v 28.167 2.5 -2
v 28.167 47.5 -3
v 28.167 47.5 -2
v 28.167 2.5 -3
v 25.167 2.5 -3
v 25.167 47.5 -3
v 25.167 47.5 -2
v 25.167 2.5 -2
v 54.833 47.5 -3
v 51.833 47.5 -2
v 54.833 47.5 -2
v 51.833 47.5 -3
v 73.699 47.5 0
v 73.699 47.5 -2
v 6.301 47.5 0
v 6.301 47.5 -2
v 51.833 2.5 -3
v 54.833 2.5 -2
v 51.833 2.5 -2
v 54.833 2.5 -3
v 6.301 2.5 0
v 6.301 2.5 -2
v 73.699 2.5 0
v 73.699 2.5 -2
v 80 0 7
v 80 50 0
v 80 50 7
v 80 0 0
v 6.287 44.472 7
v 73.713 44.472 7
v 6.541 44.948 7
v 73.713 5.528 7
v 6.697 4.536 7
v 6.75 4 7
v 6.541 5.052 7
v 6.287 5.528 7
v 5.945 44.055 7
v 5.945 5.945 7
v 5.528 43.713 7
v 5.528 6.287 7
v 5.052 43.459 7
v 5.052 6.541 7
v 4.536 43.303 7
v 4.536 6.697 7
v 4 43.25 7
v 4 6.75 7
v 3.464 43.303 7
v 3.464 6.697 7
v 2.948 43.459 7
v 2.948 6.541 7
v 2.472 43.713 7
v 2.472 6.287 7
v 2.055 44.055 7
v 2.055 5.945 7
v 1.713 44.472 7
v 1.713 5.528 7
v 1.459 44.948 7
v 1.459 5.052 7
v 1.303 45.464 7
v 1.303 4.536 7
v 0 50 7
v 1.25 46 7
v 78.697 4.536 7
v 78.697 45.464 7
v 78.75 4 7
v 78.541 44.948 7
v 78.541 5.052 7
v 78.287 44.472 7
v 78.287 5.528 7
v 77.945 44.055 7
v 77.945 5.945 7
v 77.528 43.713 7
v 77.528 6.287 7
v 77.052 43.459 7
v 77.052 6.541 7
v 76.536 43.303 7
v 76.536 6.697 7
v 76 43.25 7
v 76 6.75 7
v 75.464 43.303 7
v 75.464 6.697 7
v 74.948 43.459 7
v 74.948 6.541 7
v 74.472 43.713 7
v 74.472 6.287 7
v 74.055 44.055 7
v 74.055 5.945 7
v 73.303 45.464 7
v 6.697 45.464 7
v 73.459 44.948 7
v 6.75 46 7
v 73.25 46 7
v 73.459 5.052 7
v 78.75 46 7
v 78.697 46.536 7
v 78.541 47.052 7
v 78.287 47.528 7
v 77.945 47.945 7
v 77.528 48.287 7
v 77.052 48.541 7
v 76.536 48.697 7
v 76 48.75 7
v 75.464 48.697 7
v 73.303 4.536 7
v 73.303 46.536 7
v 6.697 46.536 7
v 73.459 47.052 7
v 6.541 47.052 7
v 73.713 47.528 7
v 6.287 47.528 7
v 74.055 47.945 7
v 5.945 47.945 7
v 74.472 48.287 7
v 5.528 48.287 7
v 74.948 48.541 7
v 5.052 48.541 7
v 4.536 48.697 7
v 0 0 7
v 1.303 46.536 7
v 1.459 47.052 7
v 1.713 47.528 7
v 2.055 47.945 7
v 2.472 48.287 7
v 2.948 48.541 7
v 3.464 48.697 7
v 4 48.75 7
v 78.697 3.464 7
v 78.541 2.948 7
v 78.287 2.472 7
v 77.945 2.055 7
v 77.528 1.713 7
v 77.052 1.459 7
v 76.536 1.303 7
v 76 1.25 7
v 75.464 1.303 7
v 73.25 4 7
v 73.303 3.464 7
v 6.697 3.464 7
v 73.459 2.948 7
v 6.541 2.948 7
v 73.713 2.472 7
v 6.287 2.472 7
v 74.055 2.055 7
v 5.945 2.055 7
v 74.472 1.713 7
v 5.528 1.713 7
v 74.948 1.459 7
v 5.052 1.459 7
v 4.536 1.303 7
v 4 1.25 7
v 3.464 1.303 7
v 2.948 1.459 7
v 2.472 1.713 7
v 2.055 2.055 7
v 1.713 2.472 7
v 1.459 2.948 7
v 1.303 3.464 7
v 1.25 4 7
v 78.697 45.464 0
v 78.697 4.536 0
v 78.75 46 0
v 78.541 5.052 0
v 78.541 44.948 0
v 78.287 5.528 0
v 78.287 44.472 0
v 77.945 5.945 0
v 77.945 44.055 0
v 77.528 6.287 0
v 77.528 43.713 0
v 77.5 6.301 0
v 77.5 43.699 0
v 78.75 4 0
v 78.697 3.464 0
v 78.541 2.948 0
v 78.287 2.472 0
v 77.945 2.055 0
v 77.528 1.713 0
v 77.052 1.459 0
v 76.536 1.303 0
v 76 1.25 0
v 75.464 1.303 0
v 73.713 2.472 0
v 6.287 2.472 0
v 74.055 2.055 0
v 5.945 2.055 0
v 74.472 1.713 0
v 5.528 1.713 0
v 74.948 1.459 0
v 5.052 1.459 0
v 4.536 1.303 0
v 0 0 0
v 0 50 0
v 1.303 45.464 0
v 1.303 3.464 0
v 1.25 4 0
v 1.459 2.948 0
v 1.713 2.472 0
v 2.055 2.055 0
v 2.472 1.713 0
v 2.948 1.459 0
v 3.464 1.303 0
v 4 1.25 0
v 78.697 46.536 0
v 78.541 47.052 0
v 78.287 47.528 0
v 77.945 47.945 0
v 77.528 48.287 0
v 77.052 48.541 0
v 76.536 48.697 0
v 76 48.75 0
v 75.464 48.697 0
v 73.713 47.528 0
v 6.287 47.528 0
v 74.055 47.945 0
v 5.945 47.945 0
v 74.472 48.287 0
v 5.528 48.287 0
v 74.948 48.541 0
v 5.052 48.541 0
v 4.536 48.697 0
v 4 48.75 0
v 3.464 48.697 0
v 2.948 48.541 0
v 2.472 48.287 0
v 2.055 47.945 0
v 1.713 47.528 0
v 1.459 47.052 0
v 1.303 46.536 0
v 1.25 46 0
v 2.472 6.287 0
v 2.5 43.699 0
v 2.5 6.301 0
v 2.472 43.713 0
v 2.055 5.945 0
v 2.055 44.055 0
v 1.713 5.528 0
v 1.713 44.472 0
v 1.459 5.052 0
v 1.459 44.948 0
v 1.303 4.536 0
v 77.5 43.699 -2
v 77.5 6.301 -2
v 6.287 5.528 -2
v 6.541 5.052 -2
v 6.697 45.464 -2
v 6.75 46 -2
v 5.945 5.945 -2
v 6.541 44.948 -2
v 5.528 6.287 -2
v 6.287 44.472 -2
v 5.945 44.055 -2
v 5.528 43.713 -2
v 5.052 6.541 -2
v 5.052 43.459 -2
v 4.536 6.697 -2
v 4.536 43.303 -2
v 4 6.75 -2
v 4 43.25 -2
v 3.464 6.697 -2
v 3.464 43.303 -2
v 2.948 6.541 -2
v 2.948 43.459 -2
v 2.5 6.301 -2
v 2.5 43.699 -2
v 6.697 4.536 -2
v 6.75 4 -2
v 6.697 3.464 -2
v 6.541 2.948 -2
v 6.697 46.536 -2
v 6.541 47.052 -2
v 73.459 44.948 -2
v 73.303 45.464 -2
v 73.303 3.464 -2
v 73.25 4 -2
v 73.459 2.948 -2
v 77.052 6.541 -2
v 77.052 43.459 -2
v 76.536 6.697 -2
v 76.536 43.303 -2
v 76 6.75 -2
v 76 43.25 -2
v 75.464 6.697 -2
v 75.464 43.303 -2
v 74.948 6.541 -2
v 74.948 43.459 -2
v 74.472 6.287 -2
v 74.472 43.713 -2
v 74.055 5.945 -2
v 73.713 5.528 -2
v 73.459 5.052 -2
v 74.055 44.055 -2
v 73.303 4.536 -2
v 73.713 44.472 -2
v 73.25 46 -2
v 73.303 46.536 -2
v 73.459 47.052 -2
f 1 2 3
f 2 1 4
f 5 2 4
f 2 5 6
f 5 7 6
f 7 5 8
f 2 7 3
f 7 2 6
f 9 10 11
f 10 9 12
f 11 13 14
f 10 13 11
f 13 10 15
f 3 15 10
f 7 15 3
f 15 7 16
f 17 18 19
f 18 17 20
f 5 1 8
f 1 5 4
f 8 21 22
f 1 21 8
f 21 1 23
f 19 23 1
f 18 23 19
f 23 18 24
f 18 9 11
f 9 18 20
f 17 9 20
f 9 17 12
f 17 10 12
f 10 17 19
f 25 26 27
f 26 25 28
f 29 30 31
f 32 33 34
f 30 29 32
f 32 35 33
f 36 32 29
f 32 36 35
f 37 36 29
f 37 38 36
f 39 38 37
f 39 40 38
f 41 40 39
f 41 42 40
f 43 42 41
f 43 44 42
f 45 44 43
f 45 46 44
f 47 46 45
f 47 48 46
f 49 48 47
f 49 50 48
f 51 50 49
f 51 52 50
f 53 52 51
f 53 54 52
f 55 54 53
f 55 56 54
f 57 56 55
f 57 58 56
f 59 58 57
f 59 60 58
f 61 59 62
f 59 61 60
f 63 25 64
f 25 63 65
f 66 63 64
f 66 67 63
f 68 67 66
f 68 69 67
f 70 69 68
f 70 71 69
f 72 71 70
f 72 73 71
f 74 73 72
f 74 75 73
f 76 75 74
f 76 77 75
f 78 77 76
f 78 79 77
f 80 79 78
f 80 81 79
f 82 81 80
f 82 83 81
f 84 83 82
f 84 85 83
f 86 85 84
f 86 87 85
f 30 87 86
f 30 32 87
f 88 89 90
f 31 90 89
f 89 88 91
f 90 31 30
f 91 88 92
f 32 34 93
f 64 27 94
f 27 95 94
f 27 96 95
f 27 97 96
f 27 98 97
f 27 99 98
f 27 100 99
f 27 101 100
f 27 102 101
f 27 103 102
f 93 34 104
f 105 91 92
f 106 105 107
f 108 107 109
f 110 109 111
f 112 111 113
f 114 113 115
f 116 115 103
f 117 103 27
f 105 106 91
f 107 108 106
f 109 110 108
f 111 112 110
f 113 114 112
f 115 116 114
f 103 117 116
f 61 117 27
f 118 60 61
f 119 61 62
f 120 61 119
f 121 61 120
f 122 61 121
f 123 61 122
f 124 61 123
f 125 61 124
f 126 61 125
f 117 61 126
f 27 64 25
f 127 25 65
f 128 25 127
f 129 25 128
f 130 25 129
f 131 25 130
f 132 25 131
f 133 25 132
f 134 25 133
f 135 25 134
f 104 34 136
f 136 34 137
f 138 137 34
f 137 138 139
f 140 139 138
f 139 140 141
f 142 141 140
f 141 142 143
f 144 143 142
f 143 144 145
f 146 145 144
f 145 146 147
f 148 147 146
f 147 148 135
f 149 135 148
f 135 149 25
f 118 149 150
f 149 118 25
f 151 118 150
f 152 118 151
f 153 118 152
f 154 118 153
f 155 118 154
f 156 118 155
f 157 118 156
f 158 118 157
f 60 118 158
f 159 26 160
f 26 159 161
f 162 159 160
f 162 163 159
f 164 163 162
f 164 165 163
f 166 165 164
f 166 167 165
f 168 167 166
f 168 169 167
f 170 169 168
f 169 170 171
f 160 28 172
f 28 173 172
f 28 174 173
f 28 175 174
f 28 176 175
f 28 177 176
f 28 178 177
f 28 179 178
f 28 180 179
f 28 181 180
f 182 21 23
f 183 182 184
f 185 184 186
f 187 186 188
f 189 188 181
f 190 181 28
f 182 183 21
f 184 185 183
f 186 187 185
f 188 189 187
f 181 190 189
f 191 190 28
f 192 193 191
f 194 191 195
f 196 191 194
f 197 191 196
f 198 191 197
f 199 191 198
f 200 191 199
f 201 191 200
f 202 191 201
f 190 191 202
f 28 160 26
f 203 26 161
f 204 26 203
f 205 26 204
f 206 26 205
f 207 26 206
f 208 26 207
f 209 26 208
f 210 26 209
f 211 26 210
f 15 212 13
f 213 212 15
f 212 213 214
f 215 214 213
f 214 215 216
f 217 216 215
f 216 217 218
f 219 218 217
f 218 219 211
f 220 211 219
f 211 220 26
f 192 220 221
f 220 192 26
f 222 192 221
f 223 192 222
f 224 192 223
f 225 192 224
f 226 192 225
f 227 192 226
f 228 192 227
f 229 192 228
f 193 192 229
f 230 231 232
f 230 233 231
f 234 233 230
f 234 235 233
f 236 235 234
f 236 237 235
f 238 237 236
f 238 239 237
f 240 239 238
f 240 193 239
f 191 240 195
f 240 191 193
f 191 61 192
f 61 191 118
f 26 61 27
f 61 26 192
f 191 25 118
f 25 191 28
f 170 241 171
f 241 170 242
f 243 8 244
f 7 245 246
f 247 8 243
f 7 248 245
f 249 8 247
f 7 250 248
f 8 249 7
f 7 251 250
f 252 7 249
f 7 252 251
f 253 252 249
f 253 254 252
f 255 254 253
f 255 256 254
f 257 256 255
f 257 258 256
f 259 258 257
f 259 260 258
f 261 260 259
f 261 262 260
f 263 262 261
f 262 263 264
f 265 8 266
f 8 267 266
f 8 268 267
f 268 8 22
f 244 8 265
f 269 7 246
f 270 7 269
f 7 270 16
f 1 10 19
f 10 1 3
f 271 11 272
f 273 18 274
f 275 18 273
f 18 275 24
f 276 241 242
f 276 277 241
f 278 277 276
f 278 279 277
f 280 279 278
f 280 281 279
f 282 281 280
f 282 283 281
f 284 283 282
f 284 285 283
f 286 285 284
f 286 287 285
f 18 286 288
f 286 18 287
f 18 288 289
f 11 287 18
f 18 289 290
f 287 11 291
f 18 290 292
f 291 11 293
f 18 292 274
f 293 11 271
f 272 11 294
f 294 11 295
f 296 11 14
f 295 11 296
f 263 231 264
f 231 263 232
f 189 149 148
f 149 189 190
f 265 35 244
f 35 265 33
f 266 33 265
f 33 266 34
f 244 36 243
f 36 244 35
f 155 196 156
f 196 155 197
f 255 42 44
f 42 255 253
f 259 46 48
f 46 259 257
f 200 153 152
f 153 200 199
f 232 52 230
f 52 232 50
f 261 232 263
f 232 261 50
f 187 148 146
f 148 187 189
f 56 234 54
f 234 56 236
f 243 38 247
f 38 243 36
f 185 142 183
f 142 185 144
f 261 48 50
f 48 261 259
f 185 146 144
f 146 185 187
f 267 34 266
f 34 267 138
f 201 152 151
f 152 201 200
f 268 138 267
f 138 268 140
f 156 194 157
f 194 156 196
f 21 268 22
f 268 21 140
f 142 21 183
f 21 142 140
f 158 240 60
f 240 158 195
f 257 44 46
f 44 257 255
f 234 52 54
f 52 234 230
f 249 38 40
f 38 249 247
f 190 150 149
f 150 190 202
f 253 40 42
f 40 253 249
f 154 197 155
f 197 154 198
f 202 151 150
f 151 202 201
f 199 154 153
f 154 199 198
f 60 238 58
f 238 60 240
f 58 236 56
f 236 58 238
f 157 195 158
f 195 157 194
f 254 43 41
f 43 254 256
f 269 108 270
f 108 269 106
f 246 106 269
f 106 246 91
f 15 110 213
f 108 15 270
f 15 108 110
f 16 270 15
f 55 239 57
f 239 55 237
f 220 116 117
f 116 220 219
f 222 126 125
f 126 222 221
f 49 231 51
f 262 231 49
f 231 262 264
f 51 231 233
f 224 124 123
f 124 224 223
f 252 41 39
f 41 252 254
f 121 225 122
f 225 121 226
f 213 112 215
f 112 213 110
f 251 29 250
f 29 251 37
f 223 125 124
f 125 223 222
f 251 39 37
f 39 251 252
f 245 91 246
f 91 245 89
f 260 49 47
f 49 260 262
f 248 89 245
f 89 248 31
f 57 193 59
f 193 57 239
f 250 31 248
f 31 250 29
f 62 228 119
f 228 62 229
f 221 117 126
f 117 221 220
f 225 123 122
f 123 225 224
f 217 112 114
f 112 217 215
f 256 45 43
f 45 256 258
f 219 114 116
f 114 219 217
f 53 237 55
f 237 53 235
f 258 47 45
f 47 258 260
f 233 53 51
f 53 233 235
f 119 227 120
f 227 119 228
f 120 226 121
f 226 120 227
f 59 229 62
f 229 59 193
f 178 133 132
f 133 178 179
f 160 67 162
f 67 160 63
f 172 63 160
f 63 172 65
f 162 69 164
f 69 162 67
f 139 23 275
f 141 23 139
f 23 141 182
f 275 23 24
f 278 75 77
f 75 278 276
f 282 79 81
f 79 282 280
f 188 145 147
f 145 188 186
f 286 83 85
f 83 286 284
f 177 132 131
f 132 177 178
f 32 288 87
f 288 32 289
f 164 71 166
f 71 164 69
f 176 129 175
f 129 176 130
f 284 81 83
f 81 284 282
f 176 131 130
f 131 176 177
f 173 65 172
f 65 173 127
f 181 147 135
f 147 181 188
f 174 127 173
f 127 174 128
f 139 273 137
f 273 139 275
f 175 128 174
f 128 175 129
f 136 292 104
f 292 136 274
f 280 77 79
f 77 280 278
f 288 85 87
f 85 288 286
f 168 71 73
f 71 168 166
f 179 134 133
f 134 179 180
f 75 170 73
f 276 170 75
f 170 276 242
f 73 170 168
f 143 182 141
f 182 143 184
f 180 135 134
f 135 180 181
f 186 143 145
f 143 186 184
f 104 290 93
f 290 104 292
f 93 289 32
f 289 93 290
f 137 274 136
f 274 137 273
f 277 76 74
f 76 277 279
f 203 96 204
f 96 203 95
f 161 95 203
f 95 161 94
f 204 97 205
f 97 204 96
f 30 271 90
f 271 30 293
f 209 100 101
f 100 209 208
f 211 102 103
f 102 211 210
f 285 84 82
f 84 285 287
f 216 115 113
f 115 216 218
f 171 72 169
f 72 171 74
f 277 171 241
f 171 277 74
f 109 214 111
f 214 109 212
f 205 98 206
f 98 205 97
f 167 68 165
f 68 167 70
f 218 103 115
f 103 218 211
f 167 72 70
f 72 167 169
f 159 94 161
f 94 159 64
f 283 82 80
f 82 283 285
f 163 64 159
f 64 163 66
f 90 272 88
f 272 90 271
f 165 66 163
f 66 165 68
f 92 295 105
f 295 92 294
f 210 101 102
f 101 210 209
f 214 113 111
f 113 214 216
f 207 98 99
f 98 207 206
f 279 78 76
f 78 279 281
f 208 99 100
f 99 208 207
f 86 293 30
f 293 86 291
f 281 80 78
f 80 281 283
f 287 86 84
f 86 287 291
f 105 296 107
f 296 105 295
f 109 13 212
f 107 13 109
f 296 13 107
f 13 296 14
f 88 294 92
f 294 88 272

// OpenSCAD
$fn = 32;

// ----------------------------------------------------------------------
// Enclosure lid: 80 x 50 x 7 mm, 4 bolt holes
// ----------------------------------------------------------------------

// --- parameters (mm) ---
length = 80;              // lid length, X
width = 50;               // lid width, Y
plate_t = 7;              // lid plate thickness
bolt_d = 5.5;             // bolt clearance
boss_lip = 4;             // bolt hole inset from the corner
sink = 1;                 // overlap of the lip and ribs into the plate
lip_h = 3;                // lip height below the plate
lip_wall = 2.5;           // lip wall thickness
rib_n = 2;                // stiffening ribs
rib_t = 3;                // rib thickness
rib_h = 4;                // rib height below the plate

module plate() {
  cube([length, width, plate_t]);
  /* lip that drops into the housing opening, sunk into the plate */
  translate([lip_wall, lip_wall, -lip_h + sink]) cube([length - 2 * lip_wall, width - 2 * lip_wall, lip_h]);
  /* stiffening ribs under the plate */
  for (i = [1 : rib_n]) translate([length * i / (rib_n + 1) - rib_t / 2, lip_wall, -rib_h + sink]) cube([rib_t, width - 2 * lip_wall, rib_h]);
}

difference() {
  plate();
  /* bolt pattern matching the corner bosses */
  for (sx = [0, 1]) for (sy = [0, 1])
    translate([sx * (length - 2 * boss_lip) + boss_lip, sy * (width - 2 * boss_lip) + boss_lip, -lip_h - 1])
      cylinder(h = plate_t + lip_h + 2, d = bolt_d);
}
